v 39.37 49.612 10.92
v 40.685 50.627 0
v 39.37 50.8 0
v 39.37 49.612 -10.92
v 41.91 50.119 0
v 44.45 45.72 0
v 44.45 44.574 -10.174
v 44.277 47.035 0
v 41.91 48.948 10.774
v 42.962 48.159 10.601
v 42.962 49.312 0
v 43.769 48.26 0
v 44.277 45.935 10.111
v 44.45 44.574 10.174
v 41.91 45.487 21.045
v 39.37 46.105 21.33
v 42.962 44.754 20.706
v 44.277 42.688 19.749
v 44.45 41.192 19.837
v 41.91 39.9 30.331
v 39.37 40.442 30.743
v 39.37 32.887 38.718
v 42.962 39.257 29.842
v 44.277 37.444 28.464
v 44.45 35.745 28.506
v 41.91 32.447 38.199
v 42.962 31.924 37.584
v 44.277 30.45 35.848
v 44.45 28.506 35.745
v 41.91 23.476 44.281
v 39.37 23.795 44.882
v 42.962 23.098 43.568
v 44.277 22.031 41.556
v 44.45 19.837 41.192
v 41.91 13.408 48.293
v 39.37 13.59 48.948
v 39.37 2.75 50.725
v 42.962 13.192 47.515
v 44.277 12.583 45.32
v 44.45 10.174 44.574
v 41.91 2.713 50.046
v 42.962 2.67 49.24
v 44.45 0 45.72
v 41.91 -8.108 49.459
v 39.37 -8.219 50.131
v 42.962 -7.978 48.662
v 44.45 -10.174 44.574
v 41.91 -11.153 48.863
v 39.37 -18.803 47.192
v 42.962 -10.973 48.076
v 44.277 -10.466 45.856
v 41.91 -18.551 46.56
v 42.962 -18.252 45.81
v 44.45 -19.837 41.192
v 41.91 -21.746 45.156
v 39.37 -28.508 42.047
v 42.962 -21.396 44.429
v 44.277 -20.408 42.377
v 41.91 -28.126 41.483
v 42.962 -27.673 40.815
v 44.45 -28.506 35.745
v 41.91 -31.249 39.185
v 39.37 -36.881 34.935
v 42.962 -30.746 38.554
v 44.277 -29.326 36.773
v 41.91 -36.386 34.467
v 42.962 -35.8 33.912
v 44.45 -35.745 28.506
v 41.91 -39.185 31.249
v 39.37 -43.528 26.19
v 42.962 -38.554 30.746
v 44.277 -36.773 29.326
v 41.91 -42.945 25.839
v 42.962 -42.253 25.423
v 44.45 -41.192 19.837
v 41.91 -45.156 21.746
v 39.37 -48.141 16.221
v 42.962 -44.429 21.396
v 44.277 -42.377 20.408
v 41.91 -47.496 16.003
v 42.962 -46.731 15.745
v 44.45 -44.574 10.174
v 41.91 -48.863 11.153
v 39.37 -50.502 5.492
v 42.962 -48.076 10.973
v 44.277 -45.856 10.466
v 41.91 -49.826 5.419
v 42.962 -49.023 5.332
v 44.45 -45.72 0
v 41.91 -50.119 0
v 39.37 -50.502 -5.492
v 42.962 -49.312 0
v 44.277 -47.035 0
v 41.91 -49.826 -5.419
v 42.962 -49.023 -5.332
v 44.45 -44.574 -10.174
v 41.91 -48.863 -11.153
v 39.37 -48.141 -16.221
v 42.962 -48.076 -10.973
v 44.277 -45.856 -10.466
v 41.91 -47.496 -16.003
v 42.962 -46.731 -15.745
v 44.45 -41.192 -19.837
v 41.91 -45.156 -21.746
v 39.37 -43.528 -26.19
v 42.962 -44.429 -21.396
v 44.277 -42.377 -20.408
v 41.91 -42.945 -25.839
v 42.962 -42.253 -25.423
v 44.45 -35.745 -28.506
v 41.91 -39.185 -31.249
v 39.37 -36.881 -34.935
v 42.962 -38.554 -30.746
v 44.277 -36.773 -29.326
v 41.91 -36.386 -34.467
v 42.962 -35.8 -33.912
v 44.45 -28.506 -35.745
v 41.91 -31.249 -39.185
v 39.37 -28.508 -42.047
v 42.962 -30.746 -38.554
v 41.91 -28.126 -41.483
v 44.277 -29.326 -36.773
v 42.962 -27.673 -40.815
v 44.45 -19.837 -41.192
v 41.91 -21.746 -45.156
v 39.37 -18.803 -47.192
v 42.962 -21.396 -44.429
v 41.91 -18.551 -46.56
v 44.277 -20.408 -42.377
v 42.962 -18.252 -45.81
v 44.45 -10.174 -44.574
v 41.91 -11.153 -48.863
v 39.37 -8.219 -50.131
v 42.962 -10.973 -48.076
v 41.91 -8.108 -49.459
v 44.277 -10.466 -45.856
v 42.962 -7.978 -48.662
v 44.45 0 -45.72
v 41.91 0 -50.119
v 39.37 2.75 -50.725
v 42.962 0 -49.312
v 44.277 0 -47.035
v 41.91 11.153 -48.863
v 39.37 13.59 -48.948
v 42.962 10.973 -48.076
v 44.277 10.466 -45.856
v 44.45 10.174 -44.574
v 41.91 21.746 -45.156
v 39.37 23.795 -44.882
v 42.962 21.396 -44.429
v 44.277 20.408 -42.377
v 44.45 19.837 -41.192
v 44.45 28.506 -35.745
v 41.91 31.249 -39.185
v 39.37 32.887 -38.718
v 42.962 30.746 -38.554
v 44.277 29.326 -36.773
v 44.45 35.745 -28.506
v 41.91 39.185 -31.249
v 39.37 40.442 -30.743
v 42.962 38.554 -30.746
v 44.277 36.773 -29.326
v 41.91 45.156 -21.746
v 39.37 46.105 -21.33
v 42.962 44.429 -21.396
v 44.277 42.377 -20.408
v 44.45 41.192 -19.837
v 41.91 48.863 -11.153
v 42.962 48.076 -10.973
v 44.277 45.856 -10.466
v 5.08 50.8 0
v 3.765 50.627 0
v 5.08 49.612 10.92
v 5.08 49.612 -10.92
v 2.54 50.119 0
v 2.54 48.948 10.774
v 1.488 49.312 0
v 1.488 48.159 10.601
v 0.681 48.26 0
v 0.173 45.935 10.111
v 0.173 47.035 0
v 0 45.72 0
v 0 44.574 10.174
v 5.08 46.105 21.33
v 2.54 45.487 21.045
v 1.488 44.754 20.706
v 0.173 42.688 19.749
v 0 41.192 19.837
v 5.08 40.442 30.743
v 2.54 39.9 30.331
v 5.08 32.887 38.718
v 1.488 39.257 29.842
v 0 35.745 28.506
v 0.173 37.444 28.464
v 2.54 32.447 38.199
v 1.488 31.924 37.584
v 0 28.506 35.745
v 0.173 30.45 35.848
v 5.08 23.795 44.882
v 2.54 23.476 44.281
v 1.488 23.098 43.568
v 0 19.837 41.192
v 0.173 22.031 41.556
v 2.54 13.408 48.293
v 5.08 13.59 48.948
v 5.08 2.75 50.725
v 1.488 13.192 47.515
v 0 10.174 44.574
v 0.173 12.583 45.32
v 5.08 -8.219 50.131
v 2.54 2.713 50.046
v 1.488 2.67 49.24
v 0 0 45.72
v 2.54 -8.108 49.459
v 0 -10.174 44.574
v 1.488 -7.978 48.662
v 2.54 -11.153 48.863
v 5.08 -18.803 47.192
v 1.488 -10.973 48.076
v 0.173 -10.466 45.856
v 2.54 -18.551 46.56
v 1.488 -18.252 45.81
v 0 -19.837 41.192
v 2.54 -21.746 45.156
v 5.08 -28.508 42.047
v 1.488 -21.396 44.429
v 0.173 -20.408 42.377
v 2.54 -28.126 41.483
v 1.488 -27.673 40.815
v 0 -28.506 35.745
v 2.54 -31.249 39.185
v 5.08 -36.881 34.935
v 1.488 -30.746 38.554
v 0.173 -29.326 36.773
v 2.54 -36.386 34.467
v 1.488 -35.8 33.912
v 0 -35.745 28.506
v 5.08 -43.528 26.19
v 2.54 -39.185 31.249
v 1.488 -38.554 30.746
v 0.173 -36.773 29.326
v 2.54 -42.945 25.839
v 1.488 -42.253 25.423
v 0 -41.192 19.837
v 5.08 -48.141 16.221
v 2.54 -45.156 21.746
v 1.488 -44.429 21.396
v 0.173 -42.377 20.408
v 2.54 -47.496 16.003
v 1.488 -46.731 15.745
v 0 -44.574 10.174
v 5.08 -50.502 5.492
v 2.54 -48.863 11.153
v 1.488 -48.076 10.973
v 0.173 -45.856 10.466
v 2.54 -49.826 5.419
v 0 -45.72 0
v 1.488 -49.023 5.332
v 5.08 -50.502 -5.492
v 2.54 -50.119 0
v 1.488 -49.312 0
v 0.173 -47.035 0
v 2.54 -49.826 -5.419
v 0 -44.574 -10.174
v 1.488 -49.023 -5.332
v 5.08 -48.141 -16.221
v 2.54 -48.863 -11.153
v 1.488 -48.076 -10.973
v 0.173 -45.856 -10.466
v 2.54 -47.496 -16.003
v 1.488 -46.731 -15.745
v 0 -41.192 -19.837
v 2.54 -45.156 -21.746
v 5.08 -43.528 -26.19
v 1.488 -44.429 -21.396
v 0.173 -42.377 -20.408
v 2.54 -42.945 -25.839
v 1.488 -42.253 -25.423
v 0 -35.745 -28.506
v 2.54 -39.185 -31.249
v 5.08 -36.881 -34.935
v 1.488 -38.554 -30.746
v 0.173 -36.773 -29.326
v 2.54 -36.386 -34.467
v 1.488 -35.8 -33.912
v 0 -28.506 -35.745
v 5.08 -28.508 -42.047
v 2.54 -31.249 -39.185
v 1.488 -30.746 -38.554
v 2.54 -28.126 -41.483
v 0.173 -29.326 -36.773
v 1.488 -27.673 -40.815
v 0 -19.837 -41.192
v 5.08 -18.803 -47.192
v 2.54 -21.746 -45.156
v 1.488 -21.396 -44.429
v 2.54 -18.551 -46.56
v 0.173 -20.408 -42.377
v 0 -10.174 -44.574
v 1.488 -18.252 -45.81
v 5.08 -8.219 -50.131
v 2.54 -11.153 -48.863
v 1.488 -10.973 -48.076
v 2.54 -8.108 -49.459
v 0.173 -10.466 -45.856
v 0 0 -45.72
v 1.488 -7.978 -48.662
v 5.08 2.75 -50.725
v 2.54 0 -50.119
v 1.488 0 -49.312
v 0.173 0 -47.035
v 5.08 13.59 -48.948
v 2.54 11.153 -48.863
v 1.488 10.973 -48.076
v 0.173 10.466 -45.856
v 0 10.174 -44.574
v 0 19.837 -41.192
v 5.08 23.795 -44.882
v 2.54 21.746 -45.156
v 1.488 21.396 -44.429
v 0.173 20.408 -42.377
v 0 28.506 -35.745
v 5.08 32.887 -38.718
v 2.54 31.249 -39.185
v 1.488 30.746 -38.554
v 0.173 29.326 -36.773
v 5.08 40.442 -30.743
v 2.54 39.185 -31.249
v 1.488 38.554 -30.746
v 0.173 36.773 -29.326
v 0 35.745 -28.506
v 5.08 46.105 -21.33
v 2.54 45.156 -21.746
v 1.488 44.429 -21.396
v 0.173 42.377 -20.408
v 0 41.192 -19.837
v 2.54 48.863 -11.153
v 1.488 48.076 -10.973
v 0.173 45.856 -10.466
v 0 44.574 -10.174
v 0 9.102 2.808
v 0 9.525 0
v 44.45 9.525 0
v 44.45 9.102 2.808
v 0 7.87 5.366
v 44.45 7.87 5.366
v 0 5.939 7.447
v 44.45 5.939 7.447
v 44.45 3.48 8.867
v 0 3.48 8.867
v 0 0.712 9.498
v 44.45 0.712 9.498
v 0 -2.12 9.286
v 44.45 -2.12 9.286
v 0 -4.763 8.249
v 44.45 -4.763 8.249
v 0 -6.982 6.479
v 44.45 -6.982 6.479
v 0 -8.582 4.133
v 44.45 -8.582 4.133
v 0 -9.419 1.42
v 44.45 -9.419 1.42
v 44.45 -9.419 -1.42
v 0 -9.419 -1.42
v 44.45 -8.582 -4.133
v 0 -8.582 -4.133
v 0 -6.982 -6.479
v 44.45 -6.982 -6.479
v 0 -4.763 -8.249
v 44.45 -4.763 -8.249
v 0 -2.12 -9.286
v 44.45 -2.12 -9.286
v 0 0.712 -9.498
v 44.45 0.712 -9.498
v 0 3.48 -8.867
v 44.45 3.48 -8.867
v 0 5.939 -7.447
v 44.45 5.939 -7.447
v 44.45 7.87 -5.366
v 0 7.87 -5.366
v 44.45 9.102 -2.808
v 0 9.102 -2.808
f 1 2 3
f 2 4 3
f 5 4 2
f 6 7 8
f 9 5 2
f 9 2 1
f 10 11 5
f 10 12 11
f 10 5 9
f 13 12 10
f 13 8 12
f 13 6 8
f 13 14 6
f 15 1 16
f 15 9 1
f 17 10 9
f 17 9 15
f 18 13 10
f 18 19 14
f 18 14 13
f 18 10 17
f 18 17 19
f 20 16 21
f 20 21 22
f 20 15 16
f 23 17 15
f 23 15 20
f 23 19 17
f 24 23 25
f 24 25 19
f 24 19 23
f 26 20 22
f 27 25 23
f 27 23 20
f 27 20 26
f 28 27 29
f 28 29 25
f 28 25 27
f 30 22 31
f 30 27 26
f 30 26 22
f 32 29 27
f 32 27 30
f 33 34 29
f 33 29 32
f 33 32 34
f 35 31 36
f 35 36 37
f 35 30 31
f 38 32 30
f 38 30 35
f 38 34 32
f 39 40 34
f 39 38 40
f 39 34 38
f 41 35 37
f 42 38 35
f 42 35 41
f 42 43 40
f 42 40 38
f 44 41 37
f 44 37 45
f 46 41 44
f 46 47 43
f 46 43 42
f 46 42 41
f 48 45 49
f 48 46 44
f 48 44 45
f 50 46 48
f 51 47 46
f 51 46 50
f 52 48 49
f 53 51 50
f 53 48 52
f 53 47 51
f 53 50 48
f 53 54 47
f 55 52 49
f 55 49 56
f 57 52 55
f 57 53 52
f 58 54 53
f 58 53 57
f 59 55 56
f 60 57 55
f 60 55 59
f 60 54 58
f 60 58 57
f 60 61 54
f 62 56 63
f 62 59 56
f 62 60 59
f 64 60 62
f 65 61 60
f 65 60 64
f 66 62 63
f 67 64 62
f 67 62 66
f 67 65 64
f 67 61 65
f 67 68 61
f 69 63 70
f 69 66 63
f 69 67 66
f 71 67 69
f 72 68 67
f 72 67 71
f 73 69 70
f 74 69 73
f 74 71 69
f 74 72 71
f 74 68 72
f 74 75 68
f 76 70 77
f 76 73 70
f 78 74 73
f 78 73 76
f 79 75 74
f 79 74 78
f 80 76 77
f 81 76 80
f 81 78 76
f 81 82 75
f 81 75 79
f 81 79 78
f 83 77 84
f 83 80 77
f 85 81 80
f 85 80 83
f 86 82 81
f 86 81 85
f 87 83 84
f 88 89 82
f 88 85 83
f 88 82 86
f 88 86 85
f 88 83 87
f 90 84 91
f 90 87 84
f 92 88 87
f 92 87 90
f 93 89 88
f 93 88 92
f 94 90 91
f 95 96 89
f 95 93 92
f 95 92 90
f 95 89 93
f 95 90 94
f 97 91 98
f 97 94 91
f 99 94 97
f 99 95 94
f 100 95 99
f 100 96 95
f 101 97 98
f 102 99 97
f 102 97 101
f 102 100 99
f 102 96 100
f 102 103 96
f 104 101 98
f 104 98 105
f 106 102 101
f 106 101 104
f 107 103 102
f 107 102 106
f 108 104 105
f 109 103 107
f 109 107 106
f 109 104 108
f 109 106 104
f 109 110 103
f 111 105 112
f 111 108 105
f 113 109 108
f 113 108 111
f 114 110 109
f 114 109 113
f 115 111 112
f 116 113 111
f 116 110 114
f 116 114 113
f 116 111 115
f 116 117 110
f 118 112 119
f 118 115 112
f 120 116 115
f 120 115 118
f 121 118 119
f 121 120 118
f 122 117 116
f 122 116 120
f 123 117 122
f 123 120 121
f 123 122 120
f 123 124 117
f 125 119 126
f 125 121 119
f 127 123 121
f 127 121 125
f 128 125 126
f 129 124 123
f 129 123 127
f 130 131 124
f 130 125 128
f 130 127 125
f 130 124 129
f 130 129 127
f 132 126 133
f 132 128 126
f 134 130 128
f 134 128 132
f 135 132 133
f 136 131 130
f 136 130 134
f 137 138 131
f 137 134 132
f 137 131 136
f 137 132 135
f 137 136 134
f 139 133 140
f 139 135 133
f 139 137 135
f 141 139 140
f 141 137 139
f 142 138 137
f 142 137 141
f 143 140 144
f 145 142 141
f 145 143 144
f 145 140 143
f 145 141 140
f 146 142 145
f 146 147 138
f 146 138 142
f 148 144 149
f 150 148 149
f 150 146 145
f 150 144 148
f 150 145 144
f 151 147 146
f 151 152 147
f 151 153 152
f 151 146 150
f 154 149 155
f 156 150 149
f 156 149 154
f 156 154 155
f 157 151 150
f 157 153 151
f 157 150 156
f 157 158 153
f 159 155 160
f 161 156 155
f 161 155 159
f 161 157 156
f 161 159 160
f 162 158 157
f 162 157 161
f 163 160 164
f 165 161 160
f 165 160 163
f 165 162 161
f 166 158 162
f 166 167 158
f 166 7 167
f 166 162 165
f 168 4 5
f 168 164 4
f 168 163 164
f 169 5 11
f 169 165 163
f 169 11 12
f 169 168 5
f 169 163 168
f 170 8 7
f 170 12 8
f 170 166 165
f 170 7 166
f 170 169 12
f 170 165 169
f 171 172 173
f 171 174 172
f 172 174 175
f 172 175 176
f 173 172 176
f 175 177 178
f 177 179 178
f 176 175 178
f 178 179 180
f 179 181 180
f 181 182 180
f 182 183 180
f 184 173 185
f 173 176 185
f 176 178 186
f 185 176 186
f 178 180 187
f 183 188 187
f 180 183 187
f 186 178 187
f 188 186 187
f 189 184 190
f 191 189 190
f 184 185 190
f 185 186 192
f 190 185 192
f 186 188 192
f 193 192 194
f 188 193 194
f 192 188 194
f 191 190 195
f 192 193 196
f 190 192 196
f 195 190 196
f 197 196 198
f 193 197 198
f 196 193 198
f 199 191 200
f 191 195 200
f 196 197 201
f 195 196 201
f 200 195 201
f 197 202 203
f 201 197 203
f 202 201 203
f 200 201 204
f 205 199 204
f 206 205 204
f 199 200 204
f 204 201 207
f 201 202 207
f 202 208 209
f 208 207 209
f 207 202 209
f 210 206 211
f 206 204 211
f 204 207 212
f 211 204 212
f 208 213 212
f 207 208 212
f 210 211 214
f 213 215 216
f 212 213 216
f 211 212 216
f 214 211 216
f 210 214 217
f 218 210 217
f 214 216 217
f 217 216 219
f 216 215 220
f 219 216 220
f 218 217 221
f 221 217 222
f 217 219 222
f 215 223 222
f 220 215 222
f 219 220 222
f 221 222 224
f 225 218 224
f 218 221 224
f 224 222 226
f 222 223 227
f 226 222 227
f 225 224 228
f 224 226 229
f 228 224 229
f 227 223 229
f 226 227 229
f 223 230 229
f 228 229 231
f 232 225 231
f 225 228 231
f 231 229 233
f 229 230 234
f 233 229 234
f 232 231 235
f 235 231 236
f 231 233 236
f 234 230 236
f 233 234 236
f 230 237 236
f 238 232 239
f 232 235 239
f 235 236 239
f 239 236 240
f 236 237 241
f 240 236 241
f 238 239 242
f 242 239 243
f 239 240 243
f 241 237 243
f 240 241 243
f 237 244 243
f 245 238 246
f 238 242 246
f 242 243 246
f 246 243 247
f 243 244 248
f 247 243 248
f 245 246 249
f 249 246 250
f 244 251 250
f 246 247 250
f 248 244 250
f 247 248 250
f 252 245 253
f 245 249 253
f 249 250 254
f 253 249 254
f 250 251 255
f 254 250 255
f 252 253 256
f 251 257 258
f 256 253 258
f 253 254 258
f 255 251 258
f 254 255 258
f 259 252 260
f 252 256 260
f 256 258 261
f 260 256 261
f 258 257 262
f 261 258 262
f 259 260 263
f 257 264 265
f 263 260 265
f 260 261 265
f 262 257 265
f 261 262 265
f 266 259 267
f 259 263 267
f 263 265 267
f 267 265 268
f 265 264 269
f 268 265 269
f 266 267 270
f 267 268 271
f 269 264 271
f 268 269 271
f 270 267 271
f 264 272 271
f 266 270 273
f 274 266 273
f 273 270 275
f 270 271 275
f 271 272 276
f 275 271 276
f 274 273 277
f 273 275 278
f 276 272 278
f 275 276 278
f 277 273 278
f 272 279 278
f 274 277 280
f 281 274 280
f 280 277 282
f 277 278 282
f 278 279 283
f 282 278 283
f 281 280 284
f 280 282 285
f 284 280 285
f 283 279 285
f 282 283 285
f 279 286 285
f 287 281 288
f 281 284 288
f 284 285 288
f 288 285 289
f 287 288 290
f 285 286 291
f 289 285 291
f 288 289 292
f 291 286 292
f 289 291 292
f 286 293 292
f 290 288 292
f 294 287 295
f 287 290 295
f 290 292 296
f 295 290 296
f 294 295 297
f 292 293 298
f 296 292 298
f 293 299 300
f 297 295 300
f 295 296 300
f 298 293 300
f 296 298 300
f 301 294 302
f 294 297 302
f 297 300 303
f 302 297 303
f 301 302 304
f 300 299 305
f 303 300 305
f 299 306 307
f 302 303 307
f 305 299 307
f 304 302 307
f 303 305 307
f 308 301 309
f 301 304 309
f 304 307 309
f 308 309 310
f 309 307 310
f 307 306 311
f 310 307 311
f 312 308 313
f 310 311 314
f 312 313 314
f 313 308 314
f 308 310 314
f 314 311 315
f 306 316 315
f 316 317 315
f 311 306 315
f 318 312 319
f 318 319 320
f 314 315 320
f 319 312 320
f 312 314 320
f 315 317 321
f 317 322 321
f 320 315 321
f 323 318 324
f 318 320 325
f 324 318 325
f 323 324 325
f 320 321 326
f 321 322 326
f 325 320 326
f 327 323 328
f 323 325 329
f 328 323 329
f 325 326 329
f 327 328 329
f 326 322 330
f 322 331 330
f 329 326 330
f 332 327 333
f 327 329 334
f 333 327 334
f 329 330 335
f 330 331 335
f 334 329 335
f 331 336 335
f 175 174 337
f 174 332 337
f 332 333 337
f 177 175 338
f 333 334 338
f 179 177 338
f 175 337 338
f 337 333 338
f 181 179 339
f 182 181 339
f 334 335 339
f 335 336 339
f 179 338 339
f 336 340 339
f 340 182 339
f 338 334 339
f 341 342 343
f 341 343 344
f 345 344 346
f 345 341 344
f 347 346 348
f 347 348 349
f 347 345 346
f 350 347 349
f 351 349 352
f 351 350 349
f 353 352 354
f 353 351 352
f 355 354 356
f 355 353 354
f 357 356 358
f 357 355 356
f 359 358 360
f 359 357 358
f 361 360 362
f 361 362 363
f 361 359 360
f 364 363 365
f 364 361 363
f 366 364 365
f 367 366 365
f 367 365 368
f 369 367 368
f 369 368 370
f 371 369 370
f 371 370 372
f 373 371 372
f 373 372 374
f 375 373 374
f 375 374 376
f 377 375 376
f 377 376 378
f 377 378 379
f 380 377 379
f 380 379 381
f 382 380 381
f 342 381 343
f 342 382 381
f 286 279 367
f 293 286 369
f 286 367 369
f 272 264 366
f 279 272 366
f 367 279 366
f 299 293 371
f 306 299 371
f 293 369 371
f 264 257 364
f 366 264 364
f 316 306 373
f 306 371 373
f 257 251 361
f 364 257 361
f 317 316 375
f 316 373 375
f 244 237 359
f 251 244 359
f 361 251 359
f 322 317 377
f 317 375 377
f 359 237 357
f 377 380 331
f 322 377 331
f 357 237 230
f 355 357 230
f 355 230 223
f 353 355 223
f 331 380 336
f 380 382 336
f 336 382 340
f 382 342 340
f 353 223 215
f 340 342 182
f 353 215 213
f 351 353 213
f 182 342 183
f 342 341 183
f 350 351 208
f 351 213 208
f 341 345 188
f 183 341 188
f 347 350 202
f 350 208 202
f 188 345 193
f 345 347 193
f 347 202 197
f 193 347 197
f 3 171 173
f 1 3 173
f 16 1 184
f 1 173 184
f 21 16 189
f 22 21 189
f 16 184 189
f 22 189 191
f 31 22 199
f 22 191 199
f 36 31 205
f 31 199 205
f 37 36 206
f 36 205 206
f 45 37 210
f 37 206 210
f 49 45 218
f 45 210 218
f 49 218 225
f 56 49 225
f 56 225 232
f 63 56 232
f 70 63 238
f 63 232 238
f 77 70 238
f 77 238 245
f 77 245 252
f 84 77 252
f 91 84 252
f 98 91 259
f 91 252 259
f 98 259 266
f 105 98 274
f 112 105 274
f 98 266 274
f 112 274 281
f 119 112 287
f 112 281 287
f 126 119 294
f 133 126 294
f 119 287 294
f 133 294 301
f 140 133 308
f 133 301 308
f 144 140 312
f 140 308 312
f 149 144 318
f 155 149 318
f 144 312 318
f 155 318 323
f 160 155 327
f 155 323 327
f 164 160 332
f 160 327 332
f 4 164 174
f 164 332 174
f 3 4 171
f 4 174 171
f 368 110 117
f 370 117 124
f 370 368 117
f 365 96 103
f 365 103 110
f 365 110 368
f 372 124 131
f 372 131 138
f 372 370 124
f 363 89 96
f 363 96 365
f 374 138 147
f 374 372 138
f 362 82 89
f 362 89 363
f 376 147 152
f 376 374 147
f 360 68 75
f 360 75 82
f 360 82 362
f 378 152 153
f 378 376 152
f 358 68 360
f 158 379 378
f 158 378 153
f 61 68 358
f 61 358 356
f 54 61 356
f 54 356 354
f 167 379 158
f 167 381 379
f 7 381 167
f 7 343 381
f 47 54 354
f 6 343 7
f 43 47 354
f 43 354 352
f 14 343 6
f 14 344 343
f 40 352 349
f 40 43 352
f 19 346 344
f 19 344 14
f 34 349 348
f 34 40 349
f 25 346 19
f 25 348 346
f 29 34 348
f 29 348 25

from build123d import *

# Parameters (mm, degrees)
F0_R     = 50.8
F0_R_2   = 9.525
F1_DEPTH = 44.45
F2_R     = 5.08
F3_R     = 5.08


with BuildPart() as f1:
    # F0 (on Right) → F1 (new body)
    with BuildSketch(Plane.YZ):
        Circle(F0_R)
        Circle(F0_R_2, mode=Mode.SUBTRACT)
    extrude(amount=F1_DEPTH)

    # F2
    f2_edges = [f1.edges().sort_by_distance(p)[0] for p in [
        (44.45, -50.8, 0),
    ]]
    fillet(f2_edges, radius=F2_R)

    # F3
    f3_edges = [f1.edges().sort_by_distance(p)[0] for p in [
        (0, -50.8, 0),
    ]]
    fillet(f3_edges, radius=F3_R)


solid = f1.part
